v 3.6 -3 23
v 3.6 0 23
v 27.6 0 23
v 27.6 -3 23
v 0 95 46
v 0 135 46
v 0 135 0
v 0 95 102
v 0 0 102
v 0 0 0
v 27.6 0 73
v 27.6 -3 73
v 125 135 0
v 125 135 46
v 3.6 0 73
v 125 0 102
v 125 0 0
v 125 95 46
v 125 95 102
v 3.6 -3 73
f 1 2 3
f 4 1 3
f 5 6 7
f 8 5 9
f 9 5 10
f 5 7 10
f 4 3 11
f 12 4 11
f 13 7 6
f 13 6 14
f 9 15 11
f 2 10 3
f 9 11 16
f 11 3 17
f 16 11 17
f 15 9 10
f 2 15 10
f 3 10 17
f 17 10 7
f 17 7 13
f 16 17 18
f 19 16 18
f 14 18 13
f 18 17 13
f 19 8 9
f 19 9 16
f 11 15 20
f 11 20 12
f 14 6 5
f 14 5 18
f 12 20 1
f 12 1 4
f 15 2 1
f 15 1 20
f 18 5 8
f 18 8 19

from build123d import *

# Parameters (mm, degrees)
F0_W     = 125
F0_H     = 95
F0_H_2   = 40
F1_DEPTH = 102
F2_START = 46
F2_DEPTH = 86.07192
F3_W     = 24
F3_H     = 50
F4_DEPTH = 3


with BuildPart() as f1:
    # F0 (on Top) → F1 (new body)
    with BuildSketch(Plane.XY):
        with Locations((62.5, 47.5)):
            Rectangle(F0_W, F0_H)
        with Locations((62.5, 115)):
            Rectangle(F0_W, F0_H_2)
    extrude(amount=F1_DEPTH)

    # F0 (on Top) → F2 (cut)
    with BuildSketch(Plane.XY.offset(F2_START)):
        with Locations((62.5, 115)):
            Rectangle(F0_W, F0_H_2)
    extrude(amount=F2_DEPTH, mode=Mode.SUBTRACT)

    # F3 (on face) → F4 (join)
    with BuildSketch(Plane.XZ):
        with Locations((15.6, 48)):
            Rectangle(F3_W, F3_H)
    extrude(amount=F4_DEPTH)


solid = f1.part
